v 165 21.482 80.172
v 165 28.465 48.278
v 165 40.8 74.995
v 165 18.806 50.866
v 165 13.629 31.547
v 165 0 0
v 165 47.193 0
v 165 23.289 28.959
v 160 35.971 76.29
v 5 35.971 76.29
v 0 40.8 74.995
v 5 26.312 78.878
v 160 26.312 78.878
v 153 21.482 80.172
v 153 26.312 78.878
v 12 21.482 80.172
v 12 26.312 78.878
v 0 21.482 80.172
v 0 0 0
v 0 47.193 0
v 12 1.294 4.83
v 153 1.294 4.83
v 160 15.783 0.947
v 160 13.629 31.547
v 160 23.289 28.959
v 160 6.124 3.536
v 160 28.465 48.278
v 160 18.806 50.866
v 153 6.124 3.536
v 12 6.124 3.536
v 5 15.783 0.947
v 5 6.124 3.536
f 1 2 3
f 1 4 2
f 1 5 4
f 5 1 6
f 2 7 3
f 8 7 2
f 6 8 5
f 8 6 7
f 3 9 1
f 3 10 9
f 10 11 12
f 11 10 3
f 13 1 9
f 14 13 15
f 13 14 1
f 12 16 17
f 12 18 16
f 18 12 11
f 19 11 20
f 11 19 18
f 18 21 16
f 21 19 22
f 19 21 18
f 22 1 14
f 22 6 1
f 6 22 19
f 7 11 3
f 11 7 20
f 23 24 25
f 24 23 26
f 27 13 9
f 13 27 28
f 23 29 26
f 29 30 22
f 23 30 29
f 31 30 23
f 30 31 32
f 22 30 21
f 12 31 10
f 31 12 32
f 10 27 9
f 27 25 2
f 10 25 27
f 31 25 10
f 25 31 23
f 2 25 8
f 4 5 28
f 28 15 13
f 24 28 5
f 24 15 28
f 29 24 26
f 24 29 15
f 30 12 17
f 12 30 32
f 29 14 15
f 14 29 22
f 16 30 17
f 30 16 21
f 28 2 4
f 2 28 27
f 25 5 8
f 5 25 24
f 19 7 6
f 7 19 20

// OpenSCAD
phone_length = 155;
phone_height = 78;
phone_depth = 10;

strength = 5;
screen_holder_width = 7;
plug_width = 20;
holder_length = 30;

rotation_degree = 15;
color("blue")
rotate([-rotation_degree,0,0])
difference() {
union() {
cube([phone_length+strength*2,phone_depth+strength*2,phone_height+strength]);
translate([+phone_length+2*strength,phone_depth+2*strength,0])rotate([0,-90,0])linear_extrude(phone_length+2*strength) polygon([[0,0],[0,holder_length],[phone_height+strength,0]]);
}
translate([strength,strength,strength])cube([phone_length,phone_depth,phone_height+strength]);
translate([strength+screen_holder_width,0,strength])cube([phone_length-screen_holder_width*2,strength,phone_height]);
translate([phone_length+strength,strength,phone_height/2-plug_width/2+strength]) cube([strength,phone_depth,plug_width]);


rotate([rotation_degree,0,0])translate([0,-0,-500])cube([500,500,500]);
}
